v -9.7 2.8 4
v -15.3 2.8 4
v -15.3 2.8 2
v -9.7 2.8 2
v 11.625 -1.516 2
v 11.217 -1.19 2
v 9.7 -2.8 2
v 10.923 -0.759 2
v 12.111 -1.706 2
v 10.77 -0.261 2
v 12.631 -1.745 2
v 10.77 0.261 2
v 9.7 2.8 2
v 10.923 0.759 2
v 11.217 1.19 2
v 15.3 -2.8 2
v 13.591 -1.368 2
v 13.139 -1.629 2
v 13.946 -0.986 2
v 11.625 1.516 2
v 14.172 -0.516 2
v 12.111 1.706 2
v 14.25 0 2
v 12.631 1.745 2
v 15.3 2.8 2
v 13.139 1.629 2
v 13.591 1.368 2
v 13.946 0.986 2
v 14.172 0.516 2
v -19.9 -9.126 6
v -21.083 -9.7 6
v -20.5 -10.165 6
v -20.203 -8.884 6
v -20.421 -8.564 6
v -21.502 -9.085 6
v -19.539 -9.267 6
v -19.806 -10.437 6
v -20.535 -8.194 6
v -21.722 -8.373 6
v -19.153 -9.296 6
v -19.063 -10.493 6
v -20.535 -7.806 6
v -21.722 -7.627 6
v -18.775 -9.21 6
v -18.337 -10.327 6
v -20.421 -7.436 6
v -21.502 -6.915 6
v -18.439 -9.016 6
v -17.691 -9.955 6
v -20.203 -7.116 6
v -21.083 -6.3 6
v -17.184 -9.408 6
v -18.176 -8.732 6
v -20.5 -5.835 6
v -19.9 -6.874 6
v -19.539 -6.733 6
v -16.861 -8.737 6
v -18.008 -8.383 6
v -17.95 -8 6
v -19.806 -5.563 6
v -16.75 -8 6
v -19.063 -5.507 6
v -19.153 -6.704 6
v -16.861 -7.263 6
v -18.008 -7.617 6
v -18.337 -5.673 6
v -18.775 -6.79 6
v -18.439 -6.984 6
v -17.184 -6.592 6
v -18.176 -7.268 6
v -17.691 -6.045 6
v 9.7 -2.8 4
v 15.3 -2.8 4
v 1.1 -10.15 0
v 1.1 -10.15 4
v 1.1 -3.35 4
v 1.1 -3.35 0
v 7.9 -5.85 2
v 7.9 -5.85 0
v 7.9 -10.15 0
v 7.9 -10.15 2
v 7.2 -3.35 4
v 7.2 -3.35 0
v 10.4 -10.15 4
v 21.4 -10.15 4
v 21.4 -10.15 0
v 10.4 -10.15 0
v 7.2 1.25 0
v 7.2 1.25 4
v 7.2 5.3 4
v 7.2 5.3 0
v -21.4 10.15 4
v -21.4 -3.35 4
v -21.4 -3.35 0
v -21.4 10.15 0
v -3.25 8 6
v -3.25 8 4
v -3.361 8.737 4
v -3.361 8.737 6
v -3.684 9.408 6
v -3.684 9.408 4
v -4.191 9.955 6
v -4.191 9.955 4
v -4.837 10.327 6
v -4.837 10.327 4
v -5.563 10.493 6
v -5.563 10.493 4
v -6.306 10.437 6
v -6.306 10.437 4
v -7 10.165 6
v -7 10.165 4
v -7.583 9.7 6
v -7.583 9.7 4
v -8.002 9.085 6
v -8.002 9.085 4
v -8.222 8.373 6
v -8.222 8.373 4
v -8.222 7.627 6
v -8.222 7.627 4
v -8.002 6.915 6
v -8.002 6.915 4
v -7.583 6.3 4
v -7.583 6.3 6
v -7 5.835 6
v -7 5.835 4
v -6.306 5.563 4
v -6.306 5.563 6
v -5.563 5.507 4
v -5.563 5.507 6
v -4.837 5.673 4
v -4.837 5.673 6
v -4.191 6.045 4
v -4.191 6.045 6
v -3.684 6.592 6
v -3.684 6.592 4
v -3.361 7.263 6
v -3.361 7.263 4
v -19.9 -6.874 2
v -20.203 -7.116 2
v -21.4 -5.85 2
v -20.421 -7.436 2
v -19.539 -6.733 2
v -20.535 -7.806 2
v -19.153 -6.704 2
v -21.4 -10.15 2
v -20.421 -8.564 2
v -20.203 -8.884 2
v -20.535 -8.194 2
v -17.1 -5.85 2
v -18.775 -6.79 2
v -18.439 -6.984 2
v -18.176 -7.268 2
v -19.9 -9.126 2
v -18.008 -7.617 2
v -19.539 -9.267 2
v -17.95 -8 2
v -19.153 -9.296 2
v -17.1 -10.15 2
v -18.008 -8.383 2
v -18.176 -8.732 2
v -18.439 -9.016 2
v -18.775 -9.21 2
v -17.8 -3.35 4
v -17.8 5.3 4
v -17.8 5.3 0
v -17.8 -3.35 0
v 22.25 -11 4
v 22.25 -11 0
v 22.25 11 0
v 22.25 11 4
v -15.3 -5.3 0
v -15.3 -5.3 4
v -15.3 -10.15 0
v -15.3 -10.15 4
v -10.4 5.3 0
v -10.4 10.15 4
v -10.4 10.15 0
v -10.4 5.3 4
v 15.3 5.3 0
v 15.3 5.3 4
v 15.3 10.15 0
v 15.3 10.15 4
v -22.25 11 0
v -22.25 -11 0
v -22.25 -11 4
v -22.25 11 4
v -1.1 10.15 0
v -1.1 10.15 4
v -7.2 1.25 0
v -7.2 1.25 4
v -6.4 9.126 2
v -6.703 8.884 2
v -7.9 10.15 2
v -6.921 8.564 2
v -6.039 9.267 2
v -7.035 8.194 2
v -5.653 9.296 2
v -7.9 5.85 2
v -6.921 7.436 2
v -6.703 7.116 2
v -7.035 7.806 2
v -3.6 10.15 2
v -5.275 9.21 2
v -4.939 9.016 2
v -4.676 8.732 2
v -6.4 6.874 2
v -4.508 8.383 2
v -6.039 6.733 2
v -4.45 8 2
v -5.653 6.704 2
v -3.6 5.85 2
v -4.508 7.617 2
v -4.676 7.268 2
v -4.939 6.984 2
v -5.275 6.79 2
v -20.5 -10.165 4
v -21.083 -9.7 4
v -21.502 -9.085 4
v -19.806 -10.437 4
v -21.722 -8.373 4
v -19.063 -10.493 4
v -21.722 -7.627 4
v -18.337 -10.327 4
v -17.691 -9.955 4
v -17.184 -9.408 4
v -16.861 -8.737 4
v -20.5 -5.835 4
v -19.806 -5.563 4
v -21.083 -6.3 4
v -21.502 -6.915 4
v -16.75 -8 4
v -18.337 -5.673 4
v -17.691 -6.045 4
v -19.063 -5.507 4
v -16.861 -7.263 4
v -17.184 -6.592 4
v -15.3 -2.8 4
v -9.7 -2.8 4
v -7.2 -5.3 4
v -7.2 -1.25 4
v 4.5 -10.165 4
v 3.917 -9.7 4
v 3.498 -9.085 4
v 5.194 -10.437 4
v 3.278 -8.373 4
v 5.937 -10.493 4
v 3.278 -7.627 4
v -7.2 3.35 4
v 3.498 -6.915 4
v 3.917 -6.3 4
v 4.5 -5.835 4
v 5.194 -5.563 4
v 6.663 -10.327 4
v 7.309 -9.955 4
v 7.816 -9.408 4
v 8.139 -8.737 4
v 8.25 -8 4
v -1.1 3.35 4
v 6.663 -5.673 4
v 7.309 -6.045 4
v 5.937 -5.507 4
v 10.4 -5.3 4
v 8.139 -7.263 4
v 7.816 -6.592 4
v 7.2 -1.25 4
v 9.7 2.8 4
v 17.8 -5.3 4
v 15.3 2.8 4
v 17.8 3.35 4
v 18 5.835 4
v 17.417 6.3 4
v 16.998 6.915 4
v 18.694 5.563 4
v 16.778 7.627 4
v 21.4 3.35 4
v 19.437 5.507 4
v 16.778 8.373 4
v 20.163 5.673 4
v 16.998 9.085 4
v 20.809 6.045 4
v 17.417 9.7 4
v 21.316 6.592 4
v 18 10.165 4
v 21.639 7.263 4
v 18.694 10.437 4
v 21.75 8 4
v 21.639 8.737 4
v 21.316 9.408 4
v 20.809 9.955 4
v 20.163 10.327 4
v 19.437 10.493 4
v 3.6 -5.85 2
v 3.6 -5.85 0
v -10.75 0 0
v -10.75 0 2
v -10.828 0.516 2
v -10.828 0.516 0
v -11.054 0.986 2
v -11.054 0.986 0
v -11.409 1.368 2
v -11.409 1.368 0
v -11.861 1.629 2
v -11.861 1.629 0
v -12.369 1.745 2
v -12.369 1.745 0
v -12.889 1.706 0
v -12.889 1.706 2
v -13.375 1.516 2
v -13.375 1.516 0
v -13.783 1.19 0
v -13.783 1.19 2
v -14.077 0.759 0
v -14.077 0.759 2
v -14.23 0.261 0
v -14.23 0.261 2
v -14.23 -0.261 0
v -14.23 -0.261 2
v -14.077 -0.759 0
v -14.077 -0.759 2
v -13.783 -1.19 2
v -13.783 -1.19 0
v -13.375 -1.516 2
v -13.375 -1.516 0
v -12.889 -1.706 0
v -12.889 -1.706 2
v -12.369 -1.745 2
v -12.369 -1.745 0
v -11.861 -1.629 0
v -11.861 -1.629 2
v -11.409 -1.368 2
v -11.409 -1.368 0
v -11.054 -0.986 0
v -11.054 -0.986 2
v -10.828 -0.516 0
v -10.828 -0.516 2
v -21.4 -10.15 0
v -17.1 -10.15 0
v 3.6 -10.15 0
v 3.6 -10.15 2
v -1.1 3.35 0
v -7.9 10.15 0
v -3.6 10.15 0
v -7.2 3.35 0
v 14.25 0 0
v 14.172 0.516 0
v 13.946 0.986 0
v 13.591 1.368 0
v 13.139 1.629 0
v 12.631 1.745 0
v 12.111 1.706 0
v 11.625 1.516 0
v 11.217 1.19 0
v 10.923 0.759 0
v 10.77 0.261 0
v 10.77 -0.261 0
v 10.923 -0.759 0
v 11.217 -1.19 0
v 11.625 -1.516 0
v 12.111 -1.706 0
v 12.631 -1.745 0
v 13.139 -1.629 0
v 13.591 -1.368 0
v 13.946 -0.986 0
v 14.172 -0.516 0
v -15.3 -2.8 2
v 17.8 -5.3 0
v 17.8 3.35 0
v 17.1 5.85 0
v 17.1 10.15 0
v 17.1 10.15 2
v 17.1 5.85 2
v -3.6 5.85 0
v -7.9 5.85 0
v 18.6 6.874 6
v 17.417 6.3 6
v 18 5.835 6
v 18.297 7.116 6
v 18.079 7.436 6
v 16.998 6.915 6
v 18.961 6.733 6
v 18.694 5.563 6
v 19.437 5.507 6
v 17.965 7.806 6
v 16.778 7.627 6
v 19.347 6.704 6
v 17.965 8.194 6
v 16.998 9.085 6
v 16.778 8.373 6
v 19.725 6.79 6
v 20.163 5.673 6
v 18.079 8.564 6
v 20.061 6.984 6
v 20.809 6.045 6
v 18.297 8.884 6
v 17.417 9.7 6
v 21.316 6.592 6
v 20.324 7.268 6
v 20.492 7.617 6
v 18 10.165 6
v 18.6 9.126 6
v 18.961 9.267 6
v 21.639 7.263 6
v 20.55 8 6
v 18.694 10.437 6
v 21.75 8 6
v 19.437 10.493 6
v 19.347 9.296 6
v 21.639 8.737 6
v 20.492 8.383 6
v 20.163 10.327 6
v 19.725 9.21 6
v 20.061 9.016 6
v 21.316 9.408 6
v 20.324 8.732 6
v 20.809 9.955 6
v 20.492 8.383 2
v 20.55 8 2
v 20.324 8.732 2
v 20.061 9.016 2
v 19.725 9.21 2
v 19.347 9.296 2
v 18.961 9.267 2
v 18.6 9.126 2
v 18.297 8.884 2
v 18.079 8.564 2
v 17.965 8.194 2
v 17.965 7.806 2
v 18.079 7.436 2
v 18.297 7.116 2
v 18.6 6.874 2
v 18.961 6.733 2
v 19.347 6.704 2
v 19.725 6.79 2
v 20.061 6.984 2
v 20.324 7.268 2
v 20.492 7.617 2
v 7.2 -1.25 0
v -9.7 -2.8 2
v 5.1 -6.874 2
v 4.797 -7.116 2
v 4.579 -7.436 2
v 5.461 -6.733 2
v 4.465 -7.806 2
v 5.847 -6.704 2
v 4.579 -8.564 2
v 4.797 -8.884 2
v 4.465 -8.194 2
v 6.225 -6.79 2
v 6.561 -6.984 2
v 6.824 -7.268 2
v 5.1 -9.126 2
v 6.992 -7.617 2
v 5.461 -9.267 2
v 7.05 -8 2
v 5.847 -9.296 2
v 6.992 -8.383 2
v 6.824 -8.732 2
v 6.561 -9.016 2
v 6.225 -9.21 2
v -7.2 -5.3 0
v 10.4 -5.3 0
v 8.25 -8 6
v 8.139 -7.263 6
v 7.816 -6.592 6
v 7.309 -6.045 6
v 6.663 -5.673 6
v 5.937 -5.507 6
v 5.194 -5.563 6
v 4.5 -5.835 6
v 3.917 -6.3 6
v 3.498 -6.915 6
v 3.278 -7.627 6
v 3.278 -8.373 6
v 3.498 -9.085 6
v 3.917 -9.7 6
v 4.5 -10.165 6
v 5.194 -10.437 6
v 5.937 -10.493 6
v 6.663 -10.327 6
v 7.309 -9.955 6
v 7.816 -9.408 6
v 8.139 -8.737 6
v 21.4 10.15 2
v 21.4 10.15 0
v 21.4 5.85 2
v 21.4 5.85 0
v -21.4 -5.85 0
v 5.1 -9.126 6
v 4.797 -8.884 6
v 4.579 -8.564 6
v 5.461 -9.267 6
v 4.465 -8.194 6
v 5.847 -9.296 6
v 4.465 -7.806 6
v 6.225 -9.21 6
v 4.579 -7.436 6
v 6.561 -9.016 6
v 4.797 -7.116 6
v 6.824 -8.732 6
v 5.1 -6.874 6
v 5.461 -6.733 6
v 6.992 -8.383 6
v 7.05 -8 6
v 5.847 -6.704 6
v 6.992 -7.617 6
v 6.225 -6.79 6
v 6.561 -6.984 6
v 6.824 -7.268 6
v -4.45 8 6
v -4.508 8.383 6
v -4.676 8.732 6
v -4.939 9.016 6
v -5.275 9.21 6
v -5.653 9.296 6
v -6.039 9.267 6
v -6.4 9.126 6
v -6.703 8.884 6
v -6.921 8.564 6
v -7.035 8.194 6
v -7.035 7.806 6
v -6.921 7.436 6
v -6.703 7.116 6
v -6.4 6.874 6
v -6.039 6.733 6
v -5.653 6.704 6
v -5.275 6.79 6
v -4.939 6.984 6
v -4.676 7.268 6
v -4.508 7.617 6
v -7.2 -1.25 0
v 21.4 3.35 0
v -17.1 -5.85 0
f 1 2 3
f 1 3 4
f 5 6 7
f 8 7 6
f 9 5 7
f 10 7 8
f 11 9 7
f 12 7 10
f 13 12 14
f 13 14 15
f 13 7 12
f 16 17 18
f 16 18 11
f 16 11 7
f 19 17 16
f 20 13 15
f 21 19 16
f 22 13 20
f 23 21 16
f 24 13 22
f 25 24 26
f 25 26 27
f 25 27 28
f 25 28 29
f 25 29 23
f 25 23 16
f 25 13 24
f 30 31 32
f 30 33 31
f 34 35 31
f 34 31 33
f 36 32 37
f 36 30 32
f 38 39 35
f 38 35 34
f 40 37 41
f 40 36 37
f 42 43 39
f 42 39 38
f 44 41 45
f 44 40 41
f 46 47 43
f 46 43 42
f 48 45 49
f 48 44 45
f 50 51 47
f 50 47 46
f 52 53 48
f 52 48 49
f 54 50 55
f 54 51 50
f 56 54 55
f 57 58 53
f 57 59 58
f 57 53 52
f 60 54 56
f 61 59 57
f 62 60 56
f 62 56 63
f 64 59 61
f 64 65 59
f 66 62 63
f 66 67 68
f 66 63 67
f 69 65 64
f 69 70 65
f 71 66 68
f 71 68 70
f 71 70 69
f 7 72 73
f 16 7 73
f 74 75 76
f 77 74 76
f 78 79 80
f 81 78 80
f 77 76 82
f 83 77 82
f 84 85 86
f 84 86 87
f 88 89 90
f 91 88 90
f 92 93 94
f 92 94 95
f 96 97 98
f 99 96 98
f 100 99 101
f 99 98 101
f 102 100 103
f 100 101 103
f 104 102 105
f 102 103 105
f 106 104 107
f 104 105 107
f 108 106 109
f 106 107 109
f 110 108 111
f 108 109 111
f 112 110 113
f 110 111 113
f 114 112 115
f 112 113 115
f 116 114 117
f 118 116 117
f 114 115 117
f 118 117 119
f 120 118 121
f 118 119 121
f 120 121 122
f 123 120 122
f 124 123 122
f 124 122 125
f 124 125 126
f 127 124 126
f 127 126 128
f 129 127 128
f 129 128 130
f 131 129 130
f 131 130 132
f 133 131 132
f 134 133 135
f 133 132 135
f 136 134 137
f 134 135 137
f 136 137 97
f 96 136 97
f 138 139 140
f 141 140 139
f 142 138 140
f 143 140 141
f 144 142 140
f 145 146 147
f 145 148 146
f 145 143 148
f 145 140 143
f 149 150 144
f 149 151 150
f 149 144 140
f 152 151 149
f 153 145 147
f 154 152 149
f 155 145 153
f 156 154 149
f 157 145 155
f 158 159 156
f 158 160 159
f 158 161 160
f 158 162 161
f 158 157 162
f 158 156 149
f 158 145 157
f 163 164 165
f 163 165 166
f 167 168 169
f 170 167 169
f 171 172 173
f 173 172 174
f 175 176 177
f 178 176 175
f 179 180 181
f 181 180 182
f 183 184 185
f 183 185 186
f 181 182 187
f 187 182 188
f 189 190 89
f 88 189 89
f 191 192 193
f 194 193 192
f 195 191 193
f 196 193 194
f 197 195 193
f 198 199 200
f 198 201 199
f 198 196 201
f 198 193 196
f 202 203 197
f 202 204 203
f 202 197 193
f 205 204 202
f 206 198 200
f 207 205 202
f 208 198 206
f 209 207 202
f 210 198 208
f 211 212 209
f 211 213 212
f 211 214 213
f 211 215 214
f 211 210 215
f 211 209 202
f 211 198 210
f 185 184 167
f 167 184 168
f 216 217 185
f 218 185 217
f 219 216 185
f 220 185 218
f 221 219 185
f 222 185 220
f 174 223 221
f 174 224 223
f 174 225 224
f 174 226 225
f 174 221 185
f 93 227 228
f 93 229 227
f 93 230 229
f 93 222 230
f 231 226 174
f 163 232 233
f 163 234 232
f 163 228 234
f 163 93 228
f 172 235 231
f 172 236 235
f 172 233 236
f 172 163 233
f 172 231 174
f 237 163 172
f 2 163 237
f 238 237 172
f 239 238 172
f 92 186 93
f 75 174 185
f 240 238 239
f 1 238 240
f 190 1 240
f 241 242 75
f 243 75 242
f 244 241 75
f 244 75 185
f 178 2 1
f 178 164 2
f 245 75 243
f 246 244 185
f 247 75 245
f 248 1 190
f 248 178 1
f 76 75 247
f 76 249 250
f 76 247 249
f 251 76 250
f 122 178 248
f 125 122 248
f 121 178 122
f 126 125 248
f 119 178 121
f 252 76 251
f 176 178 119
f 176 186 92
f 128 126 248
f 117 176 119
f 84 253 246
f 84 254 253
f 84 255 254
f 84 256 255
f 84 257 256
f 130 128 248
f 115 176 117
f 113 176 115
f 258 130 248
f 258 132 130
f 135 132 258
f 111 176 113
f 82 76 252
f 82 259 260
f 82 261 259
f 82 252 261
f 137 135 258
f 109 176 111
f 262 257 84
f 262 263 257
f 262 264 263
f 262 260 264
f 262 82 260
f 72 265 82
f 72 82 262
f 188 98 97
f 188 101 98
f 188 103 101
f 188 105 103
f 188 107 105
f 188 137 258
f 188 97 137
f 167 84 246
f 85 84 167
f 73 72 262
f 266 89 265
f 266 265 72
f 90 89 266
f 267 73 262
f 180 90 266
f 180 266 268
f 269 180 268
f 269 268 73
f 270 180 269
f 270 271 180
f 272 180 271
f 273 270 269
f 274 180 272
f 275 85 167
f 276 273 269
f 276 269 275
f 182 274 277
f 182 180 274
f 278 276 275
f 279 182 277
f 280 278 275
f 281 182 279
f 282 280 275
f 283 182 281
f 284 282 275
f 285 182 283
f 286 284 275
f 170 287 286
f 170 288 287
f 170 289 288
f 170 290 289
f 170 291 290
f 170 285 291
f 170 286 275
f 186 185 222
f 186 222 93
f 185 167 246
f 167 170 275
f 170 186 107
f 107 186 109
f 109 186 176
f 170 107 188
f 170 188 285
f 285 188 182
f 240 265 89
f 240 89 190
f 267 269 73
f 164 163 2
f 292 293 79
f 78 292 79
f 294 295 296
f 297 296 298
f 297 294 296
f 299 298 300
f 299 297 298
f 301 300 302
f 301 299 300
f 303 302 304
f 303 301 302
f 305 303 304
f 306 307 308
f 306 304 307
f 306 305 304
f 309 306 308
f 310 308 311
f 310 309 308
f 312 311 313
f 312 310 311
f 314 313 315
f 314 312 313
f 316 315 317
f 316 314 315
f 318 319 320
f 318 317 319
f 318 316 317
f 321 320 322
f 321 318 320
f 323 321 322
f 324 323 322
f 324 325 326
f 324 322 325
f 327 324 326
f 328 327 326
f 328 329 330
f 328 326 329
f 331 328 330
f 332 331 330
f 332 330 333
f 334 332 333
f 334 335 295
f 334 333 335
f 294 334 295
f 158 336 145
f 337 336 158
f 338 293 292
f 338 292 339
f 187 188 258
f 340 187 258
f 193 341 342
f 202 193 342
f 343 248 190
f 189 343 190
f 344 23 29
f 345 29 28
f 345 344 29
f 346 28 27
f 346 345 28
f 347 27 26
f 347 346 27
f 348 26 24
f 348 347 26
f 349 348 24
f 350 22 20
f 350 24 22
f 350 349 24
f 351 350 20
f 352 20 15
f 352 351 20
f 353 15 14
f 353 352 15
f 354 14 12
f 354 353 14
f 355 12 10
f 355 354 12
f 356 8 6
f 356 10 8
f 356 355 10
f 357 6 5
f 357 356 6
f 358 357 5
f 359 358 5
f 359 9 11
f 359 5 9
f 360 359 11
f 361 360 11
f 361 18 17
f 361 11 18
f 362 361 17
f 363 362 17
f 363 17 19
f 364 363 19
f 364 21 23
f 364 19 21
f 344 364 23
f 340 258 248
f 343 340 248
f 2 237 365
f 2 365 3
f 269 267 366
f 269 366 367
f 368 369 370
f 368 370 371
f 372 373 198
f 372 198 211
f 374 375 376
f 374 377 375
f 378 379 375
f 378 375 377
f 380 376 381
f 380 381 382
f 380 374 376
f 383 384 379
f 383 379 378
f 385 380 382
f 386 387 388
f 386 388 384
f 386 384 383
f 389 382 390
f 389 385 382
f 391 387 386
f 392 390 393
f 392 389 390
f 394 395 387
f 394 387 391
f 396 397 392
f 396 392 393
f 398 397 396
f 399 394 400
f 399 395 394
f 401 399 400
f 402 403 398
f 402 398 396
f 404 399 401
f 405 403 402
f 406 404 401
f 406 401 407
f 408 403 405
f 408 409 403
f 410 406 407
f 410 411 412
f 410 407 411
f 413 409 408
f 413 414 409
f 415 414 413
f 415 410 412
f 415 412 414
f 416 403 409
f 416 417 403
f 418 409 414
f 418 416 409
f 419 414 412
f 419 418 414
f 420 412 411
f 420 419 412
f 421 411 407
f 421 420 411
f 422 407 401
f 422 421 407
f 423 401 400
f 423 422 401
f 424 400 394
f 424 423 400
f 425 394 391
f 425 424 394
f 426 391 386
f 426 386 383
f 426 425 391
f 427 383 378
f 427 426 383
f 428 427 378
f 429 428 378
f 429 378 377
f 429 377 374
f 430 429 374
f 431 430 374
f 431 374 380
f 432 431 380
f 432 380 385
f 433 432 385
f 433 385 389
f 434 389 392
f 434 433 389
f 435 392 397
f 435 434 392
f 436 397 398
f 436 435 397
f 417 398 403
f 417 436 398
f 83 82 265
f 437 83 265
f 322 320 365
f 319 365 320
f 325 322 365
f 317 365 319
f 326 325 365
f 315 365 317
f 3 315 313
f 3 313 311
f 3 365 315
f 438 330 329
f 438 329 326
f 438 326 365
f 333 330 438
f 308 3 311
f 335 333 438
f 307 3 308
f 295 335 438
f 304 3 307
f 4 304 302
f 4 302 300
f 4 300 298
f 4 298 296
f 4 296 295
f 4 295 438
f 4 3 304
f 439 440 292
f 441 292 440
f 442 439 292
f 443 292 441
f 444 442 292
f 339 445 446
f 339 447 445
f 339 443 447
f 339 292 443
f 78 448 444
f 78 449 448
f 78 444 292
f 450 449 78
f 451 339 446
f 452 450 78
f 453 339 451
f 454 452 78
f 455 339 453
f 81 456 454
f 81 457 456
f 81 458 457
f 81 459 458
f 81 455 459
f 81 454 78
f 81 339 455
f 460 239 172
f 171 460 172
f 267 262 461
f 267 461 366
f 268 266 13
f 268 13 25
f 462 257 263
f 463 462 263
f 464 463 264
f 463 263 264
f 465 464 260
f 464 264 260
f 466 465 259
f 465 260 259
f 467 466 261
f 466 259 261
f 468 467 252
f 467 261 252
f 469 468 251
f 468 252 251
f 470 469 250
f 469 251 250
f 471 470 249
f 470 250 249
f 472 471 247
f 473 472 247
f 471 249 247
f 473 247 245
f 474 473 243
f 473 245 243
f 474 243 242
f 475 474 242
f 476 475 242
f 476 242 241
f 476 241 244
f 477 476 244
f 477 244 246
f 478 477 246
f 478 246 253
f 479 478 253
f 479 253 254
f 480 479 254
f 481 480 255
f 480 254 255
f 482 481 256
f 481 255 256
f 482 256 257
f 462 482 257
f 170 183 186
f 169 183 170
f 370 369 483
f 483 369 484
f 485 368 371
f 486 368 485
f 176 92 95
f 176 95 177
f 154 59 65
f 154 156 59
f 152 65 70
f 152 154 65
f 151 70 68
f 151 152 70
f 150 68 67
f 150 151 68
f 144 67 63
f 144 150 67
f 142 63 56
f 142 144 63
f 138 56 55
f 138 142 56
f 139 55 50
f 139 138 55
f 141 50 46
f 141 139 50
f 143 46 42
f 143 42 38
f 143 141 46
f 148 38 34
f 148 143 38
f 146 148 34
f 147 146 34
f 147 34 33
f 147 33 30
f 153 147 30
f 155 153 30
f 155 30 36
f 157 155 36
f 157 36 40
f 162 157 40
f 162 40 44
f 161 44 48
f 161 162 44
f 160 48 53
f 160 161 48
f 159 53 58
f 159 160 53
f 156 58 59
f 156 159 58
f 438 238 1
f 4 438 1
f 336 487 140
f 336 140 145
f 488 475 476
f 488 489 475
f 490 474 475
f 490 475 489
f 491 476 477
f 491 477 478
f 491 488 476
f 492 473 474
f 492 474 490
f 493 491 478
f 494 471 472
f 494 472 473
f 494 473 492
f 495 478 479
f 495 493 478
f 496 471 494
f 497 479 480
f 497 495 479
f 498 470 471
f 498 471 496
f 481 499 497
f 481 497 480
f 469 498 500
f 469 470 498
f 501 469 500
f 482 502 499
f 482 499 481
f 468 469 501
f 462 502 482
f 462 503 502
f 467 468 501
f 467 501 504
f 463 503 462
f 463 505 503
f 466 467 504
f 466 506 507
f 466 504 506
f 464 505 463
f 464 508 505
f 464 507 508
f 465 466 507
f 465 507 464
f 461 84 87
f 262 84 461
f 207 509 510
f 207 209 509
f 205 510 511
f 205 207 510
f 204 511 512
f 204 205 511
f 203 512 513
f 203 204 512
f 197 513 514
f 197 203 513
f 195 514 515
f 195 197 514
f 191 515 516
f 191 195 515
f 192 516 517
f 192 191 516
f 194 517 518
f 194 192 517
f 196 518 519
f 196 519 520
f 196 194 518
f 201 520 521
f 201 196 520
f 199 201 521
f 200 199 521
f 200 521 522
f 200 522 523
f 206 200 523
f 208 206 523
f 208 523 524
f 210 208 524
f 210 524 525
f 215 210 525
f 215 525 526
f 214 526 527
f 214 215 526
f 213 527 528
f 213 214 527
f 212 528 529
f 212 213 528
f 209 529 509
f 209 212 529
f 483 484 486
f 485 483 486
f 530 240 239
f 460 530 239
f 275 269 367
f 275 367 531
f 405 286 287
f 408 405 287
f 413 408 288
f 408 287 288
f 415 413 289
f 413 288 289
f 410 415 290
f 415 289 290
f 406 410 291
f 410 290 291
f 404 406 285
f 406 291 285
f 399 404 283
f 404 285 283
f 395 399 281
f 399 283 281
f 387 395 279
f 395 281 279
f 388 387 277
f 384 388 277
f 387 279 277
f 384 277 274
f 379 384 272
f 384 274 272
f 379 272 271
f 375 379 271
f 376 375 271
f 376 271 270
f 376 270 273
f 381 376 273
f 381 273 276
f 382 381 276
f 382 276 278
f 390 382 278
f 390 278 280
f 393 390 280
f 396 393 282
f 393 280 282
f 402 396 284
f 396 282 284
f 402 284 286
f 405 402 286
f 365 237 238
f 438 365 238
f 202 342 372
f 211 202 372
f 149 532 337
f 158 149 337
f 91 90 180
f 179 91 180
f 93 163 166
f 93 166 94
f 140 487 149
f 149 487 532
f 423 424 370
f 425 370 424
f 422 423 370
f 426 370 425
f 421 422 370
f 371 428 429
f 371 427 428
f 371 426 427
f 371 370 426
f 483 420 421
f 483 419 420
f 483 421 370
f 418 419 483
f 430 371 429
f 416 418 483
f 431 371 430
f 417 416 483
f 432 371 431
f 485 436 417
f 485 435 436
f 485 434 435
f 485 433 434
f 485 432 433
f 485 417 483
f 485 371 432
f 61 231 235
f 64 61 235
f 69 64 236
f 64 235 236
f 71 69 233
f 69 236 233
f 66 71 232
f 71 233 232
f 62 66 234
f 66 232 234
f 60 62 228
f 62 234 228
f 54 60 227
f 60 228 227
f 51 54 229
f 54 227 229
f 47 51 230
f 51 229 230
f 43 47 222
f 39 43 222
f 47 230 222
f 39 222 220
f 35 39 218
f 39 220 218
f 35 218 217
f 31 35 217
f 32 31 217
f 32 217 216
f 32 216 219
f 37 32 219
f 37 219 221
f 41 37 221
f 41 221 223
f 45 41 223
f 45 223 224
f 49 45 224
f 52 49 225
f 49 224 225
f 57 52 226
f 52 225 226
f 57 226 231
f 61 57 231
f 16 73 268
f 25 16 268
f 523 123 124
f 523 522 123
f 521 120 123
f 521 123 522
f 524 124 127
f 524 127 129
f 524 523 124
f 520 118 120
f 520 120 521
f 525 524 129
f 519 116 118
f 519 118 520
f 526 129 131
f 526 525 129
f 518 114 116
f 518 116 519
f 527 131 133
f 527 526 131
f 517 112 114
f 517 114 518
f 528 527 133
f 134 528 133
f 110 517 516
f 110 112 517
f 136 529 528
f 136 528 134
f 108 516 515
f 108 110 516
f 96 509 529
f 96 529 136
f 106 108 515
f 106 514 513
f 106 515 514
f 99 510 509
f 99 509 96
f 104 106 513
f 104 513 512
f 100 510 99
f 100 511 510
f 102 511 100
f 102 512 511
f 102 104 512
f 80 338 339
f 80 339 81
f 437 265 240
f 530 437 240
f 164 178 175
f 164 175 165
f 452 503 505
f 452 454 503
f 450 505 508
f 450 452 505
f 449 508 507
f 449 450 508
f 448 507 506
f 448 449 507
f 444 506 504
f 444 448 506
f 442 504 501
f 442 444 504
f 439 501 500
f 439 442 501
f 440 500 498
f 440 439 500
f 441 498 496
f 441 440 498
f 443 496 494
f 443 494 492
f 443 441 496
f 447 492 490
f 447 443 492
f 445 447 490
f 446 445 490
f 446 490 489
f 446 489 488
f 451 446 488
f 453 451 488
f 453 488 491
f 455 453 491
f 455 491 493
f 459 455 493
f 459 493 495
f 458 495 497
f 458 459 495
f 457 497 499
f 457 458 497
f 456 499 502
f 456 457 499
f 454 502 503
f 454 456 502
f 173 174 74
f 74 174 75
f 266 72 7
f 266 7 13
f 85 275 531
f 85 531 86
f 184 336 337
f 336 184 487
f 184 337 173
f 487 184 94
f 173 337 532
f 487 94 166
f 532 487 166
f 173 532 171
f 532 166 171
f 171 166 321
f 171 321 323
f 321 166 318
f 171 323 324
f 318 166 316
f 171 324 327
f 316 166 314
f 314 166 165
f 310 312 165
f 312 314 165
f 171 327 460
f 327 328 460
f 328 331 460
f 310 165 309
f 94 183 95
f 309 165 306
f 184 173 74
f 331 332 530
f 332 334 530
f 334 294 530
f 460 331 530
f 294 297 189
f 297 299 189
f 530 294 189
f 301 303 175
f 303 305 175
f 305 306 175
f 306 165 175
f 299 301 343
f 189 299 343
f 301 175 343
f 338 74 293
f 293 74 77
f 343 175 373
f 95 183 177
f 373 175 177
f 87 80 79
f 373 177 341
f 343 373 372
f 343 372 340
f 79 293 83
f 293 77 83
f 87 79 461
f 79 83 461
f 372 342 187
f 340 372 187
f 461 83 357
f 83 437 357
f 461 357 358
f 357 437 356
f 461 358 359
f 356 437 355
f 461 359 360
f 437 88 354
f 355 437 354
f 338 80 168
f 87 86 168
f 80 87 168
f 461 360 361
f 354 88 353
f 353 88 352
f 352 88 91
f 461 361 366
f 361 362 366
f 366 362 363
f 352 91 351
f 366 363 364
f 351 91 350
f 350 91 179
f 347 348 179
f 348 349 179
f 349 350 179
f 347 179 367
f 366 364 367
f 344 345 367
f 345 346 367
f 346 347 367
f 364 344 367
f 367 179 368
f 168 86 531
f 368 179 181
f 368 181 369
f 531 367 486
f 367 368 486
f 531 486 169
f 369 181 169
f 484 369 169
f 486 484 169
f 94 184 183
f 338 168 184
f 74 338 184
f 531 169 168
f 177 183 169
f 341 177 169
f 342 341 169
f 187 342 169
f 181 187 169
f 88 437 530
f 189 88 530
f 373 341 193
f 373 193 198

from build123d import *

# Parameters (mm, degrees)
SKETCH_W        = 44.5
SKETCH_H        = 22
SKETCH_R        = 1.75
SKETCH_R_2      = 1.3
PAD_DEPTH       = 4
SKETCH001_W     = 5.6
SKETCH001_H     = 5.6
POCKET_DEPTH    = 2
SKETCH002_W     = 4.3
SKETCH002_H     = 4.3
POCKET001_DEPTH = 2
SKETCH003_R     = 2.5
SKETCH003_R_2   = 1.3
PAD001_DEPTH    = 2
POCKET002_DEPTH = 4.001


with BuildPart() as part:
    # Sketch → Pad (new body)
    with BuildSketch(Plane.XY):
        Rectangle(SKETCH_W, SKETCH_H)
        with Locations((-12.5, 0)):
            Circle(SKETCH_R, mode=Mode.SUBTRACT)
        with Locations((12.5, 0)):
            Circle(SKETCH_R, mode=Mode.SUBTRACT)
        with Locations((-19.25, -8)):
            Circle(SKETCH_R_2, mode=Mode.SUBTRACT)
        with Locations((-5.75, 8)):
            Circle(SKETCH_R_2, mode=Mode.SUBTRACT)
        with Locations((19.25, 8)):
            Circle(SKETCH_R_2, mode=Mode.SUBTRACT)
        with Locations((5.75, -8)):
            Circle(SKETCH_R_2, mode=Mode.SUBTRACT)
    extrude(amount=PAD_DEPTH)

    # Sketch001 (on Face12 of Pad) → Pocket (cut)
    with BuildSketch(Plane.XY.offset(4)):
        with Locations((-12.5, 0)):
            Rectangle(SKETCH001_W, SKETCH001_H)
        with Locations((12.5, 0)):
            Rectangle(SKETCH001_W, SKETCH001_H)
    extrude(amount=-POCKET_DEPTH, mode=Mode.SUBTRACT)

    # Sketch002 → Pocket001 (cut)
    with BuildSketch(Plane(origin=(0, 0, 0), x_dir=(1, 0, 0), z_dir=(0, 0, -1))):
        with Locations((-19.25, 8)):
            Rectangle(SKETCH002_W, SKETCH002_H)
        with Locations((5.75, 8)):
            Rectangle(SKETCH002_W, SKETCH002_H)
        with Locations((-5.75, -8)):
            Rectangle(SKETCH002_W, SKETCH002_H)
        with Locations((19.25, -8)):
            Rectangle(SKETCH002_W, SKETCH002_H)
    extrude(amount=-POCKET001_DEPTH, mode=Mode.SUBTRACT)

    # Sketch003 (on Face5 of Pocket001) → Pad001 (join)
    with BuildSketch(Plane.XY.offset(4)):
        with Locations((-5.75, 8)):
            Circle(SKETCH003_R)
        with Locations((-5.75, 8)):
            Circle(SKETCH003_R_2, mode=Mode.SUBTRACT)
        with Locations((-19.25, -8)):
            Circle(SKETCH003_R)
        with Locations((-19.25, -8)):
            Circle(SKETCH003_R_2, mode=Mode.SUBTRACT)
        with Locations((5.75, -8)):
            Circle(SKETCH003_R)
        with Locations((5.75, -8)):
            Circle(SKETCH003_R_2, mode=Mode.SUBTRACT)
        with Locations((19.25, 8)):
            Circle(SKETCH003_R)
        with Locations((19.25, 8)):
            Circle(SKETCH003_R_2, mode=Mode.SUBTRACT)
    extrude(amount=PAD001_DEPTH)

    # Sketch004 (on Face5 of Pad001) → Pocket002 (cut, through all)
    with BuildSketch(Plane.XY.offset(4)):
        Polygon((-21.4, 10.15), (-10.4, 10.15), (-10.4, 5.3), (-17.8, 5.3), (-17.8, -3.35), (-21.4, -3.35), align=None)
        Polygon((17.8, 3.35), (21.4, 3.35), (21.4, -10.15), (10.4, -10.15), (10.4, -5.3), (17.8, -5.3), align=None)
        Polygon((-1.1, 10.15), (-1.1, 3.35), (-7.2, 3.35), (-7.2, 1.25), (7.2, 1.25), (7.2, 5.3), (15.3, 5.3), (15.3, 10.15), align=None)
        Polygon((-15.3, -5.3), (-15.3, -10.15), (1.1, -10.15), (1.1, -3.35), (7.2, -3.35), (7.2, -1.25), (-7.2, -1.25), (-7.2, -5.3), align=None)
    extrude(amount=-POCKET002_DEPTH, mode=Mode.SUBTRACT)


solid = part.part
